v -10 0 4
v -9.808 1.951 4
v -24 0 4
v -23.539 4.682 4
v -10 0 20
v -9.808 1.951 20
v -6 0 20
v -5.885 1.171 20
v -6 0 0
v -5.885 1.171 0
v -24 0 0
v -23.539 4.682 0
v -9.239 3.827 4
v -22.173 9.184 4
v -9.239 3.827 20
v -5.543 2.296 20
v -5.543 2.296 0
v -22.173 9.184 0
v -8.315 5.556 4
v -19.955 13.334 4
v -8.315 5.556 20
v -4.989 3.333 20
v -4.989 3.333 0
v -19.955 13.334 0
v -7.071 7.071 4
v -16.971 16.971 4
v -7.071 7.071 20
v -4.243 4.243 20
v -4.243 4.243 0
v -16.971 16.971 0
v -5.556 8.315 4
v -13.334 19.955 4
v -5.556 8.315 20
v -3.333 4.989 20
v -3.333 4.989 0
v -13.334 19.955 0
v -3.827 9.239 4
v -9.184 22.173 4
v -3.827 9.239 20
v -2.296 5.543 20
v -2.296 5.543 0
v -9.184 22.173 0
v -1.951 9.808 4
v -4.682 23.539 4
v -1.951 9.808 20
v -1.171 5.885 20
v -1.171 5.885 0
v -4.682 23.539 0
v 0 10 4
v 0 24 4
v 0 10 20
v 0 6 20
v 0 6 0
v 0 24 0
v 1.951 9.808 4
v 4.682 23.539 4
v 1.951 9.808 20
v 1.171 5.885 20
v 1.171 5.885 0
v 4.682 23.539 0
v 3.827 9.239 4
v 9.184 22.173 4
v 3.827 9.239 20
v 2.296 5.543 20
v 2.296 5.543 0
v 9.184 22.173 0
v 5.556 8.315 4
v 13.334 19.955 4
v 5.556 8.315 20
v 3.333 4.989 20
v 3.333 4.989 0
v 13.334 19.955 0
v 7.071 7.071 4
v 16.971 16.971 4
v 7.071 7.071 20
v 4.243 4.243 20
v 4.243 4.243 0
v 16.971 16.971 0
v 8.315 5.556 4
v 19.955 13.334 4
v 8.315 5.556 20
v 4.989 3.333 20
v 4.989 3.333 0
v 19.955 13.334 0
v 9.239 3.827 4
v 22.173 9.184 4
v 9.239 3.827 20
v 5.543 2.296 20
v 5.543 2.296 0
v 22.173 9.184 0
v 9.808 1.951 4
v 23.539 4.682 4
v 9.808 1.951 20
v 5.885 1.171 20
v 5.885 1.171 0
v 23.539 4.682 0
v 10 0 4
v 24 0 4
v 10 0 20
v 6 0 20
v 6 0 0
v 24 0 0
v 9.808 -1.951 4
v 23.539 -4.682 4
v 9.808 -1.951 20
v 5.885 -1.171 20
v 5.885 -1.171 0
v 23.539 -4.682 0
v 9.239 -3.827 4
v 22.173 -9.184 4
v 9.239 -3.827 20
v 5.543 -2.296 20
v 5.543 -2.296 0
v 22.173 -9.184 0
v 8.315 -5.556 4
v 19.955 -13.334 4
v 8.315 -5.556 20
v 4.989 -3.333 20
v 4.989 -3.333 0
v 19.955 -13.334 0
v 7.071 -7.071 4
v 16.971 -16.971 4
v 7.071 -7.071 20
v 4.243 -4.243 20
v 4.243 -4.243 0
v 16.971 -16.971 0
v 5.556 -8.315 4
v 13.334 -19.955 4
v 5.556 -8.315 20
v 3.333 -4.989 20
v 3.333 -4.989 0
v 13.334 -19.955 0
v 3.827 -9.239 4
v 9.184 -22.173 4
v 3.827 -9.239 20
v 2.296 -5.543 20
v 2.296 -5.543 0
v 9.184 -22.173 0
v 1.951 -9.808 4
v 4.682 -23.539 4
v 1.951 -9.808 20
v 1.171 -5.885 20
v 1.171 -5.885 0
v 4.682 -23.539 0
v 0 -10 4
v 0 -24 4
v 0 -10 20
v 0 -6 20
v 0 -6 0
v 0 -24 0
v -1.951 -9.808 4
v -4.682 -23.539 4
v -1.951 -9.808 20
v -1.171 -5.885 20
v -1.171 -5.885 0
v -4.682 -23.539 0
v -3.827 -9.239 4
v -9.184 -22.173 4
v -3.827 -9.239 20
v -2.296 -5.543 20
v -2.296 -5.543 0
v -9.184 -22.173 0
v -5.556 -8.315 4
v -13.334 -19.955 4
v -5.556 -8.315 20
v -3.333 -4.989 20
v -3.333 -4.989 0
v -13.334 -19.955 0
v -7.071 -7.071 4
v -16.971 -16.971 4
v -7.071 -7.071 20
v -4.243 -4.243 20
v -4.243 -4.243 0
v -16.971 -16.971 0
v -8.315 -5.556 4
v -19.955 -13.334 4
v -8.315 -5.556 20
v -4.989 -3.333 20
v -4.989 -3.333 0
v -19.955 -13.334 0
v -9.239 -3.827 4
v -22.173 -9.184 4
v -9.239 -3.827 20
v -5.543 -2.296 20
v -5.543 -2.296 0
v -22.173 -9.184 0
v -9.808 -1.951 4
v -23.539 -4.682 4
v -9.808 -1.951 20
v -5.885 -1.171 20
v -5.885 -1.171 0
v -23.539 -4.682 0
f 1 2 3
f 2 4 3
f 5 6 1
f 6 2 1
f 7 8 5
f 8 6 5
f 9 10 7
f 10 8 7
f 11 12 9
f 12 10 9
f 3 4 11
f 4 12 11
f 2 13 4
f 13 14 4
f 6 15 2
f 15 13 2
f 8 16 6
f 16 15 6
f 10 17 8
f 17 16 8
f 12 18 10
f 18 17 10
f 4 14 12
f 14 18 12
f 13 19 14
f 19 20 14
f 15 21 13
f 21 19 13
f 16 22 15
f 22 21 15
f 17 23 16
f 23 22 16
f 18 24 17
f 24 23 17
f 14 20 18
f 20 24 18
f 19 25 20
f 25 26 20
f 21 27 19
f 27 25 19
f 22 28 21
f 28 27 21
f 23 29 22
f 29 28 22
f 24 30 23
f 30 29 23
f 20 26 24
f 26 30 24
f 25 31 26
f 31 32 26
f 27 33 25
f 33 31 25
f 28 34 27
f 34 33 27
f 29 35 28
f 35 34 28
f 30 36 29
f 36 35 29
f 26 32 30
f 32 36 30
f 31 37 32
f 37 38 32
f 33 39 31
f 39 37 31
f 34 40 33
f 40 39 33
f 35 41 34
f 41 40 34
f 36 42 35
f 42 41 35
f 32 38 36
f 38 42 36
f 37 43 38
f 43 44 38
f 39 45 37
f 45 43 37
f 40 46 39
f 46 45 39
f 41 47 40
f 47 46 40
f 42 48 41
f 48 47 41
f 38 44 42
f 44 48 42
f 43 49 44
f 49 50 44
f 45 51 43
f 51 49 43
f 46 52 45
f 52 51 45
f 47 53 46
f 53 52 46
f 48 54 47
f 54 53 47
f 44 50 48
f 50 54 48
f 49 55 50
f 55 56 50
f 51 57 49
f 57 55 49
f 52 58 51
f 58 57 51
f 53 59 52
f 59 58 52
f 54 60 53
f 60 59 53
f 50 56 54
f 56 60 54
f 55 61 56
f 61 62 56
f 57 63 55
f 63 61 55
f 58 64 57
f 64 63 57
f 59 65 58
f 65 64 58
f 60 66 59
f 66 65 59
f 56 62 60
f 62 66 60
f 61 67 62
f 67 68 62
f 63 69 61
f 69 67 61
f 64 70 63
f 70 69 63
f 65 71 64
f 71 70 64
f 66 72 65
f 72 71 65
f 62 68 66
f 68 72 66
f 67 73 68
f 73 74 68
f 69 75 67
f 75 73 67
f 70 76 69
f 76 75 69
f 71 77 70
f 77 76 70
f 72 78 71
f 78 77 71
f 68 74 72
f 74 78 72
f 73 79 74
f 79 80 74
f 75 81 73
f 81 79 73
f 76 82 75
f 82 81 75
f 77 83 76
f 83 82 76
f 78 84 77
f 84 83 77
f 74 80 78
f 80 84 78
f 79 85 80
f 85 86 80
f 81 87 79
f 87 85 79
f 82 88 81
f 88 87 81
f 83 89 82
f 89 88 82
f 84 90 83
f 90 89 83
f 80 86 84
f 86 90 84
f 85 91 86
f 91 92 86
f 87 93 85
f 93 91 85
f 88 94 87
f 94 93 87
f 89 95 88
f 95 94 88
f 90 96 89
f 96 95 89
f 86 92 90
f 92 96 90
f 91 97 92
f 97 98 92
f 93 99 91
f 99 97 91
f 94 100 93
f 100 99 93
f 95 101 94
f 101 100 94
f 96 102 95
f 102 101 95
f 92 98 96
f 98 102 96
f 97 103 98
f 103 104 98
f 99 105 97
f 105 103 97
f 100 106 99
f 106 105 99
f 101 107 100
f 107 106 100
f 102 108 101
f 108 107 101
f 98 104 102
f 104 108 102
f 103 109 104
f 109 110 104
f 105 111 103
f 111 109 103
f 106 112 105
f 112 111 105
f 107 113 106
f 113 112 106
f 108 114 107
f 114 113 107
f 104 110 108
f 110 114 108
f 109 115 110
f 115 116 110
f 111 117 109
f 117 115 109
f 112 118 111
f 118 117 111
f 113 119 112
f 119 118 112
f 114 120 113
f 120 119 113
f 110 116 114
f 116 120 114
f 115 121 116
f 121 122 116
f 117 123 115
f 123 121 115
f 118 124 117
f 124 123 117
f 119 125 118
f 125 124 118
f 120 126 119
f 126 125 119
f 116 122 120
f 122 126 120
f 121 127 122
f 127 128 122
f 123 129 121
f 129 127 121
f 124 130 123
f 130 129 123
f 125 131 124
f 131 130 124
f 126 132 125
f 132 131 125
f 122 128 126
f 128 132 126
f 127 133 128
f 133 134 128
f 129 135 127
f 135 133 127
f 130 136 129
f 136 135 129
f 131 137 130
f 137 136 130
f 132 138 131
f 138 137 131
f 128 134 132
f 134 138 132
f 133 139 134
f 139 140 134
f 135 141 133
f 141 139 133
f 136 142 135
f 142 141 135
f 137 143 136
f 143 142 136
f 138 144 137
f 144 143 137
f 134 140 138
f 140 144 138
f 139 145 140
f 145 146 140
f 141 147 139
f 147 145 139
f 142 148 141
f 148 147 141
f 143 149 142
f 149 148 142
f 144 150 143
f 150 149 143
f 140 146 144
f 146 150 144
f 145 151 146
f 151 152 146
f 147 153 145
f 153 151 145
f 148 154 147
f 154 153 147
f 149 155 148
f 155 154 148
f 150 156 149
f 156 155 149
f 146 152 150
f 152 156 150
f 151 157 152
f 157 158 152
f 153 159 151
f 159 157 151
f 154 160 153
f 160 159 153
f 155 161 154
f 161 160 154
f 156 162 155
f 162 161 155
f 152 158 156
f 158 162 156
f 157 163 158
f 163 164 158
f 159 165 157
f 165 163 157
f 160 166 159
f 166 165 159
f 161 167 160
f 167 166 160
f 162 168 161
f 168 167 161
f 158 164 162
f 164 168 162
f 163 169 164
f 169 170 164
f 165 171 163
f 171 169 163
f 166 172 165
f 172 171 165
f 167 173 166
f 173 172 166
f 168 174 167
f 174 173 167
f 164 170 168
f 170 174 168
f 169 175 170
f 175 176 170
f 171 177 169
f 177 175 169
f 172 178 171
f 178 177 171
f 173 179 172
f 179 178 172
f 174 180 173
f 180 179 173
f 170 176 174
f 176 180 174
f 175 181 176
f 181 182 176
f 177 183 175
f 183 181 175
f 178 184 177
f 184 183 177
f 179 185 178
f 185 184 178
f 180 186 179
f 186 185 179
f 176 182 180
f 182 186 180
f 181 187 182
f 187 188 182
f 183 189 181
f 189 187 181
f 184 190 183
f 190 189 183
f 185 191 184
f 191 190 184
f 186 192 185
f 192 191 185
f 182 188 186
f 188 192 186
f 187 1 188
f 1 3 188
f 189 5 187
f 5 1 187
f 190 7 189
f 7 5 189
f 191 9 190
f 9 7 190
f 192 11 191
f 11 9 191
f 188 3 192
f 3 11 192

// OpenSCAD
$fn = 32;

// ----------------------------------------------------------------------
// Revolved part: flanged bushing R24
// ----------------------------------------------------------------------

// --- parameters (mm) ---
bore_r = 6;               // bore radius
flange_r = 24;            // flange radius
flange_h = 4;             // flange thickness
sleeve_r = 10;            // sleeve radius
total_h = 20;             // overall height
revolve_angle = 360;      // revolve sweep, degrees
fit_tol = 0.05;           // declared fit tolerance (prompt contract)
free_tol = 0.2;           // declared free tolerance (prompt contract)

bore_d = 2 * bore_r;
flange_d = 2 * flange_r;
sleeve_d = 2 * sleeve_r;

profile = [[6, 0], [24, 0], [24, 4], [10, 4], [10, 20], [6, 20]];  // primary outline, 6 points, counter clockwise

// --- the one profile operation ---
rotate_extrude(angle = revolve_angle) polygon(points = profile);
